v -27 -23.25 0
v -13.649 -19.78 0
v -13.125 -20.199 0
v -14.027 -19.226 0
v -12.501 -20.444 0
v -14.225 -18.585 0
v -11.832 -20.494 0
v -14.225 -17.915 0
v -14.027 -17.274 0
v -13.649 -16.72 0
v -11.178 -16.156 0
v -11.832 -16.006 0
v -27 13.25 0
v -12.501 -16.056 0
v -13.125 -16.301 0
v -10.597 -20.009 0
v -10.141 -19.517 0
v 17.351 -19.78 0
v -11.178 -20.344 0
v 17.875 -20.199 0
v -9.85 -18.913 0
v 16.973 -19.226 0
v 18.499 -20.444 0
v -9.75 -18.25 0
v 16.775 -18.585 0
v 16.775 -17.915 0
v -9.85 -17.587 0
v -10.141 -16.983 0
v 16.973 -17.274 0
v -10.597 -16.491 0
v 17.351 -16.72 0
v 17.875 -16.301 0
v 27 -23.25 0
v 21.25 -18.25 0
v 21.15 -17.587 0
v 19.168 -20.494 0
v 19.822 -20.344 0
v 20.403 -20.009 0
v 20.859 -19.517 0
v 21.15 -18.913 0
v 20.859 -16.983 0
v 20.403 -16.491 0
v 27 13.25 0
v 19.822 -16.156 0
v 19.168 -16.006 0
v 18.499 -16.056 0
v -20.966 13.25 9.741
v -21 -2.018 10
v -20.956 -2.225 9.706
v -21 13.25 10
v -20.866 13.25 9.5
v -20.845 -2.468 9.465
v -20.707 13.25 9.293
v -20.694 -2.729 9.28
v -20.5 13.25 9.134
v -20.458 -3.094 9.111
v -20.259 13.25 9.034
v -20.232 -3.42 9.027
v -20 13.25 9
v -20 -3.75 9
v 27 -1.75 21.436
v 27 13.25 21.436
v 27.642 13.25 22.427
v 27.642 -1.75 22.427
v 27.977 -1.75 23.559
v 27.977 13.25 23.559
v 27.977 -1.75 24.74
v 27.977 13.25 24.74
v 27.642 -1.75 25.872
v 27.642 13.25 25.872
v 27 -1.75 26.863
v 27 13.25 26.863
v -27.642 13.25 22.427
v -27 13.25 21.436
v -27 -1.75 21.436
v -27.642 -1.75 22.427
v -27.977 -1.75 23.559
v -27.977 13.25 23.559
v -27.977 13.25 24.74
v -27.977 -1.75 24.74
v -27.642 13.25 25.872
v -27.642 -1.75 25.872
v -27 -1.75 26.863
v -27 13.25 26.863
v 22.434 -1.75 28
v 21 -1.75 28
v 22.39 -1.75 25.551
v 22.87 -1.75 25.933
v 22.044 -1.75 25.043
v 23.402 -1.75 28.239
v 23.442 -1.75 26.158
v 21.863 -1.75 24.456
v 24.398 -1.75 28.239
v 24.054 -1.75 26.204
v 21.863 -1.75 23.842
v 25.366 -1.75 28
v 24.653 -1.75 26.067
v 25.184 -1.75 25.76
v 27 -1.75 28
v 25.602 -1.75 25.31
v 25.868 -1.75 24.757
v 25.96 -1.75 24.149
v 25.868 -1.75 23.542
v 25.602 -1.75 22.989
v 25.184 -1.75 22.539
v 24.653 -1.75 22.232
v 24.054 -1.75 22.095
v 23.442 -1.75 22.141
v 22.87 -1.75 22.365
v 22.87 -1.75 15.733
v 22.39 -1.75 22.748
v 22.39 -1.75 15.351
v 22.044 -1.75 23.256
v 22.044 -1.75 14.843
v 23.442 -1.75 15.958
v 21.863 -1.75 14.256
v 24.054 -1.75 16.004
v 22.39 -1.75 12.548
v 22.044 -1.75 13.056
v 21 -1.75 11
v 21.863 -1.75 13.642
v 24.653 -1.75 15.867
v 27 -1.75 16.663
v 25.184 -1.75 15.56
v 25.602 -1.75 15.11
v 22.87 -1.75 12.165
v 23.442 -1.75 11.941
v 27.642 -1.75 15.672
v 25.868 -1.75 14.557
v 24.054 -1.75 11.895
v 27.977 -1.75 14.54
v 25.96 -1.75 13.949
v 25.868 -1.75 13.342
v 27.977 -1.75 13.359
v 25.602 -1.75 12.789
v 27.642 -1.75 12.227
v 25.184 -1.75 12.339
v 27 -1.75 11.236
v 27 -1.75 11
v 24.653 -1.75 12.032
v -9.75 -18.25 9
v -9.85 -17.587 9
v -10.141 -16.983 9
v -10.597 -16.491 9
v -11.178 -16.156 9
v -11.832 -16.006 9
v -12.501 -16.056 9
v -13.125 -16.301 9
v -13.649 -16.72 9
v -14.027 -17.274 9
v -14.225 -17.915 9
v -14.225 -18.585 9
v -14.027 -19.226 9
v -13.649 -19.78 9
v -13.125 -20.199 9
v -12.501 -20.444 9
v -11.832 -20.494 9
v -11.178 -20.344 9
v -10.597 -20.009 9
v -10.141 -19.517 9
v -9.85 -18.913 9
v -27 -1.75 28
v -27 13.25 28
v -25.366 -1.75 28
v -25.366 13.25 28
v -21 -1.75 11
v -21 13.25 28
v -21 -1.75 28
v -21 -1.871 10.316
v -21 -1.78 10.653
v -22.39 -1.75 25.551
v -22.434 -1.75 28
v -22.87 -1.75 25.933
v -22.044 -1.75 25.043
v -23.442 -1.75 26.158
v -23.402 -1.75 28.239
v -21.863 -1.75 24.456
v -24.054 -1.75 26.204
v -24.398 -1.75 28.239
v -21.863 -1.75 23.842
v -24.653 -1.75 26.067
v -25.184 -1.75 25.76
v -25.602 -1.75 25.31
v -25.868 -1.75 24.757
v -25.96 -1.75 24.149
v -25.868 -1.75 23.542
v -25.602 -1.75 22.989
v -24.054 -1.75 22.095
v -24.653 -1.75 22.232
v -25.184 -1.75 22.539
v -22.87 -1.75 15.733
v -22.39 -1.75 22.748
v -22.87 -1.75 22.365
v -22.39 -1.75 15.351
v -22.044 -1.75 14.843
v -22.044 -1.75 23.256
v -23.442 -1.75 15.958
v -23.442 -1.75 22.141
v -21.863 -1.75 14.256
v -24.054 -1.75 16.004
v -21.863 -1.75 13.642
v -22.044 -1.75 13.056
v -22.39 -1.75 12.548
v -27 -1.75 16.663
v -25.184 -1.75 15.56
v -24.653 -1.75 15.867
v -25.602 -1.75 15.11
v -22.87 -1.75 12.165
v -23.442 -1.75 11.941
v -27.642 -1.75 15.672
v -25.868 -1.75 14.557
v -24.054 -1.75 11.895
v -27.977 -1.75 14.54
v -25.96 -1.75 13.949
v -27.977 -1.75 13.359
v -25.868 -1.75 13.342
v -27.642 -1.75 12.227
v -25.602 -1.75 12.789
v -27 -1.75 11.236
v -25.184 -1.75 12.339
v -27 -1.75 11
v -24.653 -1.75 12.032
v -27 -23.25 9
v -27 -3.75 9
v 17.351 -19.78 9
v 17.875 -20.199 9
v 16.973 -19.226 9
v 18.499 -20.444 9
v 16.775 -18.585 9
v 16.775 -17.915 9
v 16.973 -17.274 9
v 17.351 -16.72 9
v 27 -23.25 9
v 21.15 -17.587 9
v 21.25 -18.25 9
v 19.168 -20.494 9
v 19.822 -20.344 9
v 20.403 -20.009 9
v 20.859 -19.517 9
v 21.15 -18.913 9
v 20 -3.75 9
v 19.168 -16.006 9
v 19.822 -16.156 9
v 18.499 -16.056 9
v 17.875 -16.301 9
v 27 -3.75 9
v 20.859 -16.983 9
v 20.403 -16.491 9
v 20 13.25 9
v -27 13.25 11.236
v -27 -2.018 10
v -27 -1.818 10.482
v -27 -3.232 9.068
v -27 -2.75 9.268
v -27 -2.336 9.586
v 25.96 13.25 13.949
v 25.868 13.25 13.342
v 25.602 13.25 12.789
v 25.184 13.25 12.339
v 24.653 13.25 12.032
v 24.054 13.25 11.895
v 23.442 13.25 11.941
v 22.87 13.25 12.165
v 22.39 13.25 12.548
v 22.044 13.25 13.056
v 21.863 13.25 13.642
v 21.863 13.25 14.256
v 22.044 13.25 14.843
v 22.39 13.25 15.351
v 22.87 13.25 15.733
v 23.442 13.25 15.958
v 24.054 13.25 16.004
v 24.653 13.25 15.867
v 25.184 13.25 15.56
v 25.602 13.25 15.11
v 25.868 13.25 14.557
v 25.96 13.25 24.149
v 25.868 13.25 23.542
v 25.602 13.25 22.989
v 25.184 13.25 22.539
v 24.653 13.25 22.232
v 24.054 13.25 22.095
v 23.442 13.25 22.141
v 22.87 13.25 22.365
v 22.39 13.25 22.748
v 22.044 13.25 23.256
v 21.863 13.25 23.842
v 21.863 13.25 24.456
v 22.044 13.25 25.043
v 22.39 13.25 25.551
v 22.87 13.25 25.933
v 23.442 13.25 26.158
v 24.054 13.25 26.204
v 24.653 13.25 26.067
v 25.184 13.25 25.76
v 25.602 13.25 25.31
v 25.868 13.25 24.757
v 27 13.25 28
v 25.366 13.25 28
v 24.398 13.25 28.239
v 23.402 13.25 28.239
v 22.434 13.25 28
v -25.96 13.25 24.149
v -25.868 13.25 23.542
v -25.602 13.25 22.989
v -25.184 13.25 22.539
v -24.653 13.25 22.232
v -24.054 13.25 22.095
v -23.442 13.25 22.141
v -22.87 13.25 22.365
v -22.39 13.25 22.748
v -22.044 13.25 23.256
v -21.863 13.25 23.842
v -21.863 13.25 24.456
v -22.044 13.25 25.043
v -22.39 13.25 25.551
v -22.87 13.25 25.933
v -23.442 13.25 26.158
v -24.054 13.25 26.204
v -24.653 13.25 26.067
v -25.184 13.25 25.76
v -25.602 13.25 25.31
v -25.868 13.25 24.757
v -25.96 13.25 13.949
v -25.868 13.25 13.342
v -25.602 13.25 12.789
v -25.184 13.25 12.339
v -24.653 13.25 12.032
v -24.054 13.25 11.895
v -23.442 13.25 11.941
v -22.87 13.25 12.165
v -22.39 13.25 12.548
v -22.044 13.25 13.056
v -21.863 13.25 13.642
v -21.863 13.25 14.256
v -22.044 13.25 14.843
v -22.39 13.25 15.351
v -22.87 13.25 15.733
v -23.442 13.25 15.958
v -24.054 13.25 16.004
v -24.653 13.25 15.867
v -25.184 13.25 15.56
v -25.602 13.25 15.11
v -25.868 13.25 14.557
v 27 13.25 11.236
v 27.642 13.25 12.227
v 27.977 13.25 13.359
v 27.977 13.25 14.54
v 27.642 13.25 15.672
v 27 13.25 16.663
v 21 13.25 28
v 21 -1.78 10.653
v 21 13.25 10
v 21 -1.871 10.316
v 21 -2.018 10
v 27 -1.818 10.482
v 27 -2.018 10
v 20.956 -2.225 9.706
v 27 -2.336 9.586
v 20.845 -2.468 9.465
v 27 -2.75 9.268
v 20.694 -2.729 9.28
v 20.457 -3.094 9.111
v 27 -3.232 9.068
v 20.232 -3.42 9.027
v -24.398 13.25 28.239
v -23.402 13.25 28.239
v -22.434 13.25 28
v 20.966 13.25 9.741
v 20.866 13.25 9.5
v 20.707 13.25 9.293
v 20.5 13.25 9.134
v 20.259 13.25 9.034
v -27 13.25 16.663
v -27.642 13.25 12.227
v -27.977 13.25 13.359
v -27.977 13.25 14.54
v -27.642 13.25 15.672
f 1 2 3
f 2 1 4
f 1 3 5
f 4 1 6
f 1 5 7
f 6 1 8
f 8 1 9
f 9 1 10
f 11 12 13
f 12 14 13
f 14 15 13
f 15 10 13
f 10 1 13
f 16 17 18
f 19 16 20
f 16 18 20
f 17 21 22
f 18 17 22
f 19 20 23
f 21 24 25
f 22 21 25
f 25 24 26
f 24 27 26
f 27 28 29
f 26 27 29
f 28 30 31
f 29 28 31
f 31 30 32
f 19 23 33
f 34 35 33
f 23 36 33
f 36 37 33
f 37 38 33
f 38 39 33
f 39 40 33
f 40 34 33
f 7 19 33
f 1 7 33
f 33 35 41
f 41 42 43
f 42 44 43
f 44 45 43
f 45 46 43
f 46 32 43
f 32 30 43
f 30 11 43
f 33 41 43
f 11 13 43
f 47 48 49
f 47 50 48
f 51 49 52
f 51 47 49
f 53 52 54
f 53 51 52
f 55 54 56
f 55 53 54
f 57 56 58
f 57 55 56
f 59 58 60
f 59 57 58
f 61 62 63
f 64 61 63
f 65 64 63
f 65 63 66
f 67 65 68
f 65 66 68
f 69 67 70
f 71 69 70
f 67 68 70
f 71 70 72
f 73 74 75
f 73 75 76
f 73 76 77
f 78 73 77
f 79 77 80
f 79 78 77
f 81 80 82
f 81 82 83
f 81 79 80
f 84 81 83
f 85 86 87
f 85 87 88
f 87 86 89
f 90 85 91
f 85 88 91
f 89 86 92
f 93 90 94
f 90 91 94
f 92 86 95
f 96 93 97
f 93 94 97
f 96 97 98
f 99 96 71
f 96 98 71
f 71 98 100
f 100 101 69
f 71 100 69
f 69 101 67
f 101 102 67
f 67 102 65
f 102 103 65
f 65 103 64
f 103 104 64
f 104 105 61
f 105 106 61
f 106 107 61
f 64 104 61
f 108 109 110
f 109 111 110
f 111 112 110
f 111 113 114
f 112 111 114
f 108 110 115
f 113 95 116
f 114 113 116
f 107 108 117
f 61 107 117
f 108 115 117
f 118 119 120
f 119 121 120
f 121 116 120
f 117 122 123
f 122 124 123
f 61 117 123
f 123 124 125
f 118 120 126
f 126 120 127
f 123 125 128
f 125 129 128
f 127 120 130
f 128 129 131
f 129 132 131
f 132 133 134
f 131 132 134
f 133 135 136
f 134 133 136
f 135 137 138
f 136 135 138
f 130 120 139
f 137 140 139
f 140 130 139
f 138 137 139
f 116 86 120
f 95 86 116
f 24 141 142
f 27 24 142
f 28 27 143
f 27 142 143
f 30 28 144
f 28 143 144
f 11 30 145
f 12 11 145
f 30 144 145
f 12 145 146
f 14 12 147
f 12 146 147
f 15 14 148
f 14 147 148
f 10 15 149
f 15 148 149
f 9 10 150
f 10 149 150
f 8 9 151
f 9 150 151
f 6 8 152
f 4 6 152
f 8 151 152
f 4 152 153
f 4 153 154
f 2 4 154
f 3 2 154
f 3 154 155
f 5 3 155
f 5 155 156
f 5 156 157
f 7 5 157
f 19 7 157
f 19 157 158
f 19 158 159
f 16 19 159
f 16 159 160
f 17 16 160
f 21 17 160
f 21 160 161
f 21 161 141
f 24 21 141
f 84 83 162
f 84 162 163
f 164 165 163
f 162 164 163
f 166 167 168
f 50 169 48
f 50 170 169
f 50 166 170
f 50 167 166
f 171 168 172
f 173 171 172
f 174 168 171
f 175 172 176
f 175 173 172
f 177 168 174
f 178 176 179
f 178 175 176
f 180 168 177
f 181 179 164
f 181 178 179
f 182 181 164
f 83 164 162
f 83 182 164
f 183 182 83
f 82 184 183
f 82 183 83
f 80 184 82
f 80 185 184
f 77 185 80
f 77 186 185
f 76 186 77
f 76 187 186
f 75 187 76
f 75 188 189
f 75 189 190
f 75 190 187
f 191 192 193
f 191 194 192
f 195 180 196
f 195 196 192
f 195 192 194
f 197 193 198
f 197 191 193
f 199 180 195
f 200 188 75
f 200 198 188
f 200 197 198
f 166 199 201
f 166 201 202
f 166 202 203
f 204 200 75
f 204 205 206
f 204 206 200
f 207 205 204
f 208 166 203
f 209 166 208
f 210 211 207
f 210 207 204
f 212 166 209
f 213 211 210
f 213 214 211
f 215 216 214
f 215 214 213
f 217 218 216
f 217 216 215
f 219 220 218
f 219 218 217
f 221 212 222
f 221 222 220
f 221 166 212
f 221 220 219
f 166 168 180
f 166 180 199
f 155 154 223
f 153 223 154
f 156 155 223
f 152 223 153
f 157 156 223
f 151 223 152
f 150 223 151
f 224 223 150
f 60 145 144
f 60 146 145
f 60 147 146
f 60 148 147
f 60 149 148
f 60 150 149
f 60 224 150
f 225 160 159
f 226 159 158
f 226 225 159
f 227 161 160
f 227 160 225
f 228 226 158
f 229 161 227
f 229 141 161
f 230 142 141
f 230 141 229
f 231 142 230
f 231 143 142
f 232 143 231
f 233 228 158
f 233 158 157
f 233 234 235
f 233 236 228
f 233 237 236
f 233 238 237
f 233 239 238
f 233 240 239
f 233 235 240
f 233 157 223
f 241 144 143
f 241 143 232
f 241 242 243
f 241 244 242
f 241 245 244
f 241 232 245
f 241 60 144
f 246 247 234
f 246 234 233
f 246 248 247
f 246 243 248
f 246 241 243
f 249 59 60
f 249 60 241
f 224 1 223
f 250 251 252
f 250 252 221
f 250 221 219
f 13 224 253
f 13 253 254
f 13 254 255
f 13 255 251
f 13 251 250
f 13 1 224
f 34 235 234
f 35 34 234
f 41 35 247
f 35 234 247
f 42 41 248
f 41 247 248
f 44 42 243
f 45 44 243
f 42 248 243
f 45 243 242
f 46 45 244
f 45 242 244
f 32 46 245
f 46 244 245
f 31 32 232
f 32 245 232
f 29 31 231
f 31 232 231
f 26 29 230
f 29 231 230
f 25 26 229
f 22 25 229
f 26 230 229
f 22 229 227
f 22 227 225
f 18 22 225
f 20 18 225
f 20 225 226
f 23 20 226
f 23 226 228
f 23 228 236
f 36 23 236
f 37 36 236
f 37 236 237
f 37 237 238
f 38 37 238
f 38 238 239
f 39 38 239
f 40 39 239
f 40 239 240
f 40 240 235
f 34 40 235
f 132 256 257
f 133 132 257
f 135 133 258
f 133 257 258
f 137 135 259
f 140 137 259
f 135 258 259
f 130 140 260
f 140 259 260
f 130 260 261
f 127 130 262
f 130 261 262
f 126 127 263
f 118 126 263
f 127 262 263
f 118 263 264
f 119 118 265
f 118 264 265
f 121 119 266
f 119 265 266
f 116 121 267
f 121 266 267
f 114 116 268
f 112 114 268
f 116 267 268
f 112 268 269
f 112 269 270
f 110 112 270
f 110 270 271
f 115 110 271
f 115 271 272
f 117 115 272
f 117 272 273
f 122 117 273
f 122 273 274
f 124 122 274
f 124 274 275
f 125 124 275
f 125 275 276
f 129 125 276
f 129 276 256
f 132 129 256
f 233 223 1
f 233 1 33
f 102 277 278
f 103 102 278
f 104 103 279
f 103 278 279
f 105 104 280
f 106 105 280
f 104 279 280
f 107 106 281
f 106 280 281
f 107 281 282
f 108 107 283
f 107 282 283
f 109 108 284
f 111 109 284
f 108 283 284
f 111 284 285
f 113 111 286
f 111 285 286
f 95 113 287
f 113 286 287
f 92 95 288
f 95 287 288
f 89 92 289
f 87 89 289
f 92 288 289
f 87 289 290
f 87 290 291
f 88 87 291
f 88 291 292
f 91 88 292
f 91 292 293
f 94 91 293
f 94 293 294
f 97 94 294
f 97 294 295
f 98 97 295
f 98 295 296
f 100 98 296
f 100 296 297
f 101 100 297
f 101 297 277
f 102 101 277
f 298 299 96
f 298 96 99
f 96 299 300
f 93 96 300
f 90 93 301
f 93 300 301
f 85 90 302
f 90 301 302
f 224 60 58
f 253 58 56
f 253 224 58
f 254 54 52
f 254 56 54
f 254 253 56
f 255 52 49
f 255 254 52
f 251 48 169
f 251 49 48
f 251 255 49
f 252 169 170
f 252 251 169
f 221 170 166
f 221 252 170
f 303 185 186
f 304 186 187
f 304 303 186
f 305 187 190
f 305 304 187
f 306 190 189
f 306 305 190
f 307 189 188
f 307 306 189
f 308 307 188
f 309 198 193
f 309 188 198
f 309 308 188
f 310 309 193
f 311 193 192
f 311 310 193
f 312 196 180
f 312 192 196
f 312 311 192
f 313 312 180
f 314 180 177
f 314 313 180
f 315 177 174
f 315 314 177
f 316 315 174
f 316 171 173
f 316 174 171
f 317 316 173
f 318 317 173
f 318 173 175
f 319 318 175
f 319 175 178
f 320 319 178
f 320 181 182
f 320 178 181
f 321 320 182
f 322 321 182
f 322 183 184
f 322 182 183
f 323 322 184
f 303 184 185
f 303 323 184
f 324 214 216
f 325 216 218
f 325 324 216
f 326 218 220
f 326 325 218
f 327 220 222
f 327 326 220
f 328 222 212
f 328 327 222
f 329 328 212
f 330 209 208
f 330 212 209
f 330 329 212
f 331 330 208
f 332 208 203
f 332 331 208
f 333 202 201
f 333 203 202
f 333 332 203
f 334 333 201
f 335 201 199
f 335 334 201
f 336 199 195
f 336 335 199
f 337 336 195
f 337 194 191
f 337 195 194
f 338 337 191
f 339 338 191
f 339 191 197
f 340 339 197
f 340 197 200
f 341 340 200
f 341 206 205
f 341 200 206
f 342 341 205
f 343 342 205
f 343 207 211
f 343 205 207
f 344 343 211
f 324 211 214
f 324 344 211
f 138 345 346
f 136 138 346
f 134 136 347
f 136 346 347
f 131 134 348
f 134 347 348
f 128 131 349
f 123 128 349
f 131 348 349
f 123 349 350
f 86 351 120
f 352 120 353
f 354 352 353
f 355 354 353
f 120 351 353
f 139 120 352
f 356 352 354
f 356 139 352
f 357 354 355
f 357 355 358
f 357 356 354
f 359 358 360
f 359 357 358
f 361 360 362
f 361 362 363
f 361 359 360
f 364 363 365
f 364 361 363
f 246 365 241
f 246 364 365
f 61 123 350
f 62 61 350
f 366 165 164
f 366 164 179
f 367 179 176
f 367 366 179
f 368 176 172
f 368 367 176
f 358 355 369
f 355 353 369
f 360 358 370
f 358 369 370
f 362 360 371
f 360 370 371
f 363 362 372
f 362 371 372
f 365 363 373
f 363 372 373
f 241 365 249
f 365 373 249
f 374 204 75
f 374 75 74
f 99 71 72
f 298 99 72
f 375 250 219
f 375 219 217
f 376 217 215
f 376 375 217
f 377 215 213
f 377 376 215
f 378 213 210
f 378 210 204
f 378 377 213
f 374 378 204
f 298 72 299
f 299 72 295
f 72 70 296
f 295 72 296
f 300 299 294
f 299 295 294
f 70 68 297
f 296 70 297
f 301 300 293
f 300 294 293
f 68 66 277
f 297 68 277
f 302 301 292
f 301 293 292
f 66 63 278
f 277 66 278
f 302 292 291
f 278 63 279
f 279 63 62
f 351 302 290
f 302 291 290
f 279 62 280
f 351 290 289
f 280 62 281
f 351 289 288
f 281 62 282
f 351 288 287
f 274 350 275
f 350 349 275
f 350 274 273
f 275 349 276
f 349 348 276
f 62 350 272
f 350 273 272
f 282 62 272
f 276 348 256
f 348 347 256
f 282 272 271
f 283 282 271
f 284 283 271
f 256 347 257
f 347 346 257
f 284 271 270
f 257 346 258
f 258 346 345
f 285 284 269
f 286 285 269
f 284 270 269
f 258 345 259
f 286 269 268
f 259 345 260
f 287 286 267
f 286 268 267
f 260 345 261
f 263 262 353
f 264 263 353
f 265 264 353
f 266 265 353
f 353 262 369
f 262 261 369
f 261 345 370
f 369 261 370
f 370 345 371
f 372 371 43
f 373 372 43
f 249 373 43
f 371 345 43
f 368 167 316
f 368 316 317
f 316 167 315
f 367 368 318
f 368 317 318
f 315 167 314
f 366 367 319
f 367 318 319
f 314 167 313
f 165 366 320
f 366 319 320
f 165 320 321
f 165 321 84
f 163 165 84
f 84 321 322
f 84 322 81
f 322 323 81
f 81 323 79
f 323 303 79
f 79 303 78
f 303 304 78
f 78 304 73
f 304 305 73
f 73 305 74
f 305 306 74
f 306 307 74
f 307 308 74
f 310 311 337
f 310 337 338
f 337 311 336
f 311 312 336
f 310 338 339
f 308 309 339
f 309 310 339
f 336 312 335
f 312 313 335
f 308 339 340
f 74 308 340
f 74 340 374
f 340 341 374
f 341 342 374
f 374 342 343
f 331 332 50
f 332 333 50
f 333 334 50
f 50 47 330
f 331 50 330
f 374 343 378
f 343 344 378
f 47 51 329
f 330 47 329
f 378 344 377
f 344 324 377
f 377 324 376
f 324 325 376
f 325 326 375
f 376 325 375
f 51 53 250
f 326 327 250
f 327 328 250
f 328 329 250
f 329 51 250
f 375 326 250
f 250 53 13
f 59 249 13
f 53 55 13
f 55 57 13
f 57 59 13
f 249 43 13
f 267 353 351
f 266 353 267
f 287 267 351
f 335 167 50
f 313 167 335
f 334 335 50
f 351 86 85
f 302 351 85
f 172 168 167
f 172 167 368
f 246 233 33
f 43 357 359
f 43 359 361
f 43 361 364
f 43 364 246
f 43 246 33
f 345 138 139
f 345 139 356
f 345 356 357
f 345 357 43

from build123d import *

# Parameters (mm, degrees)
SKETCH1_W           = 54
SKETCH1_H           = 26.5
BOSS_EXTRUDE1_DEPTH = 9
SKETCH2_W           = 6
SKETCH2_H           = 15
BOSS_EXTRUDE2_DEPTH = 19
SKETCH4_R           = 2.06
CUT_EXTRUDE1_DEPTH  = 19
SKETCH5_R           = 2.06
BOSS_EXTRUDE3_DEPTH = 15
SKETCH8_W           = 54
SKETCH8_H           = 10
BOSS_EXTRUDE5_DEPTH = 9
SKETCH9_R           = 2.25
CUT_EXTRUDE3_DEPTH  = 15
FILLET1_R           = 2
FILLET2_R           = 1


with BuildPart() as part:
    # Sketch1 → Boss-Extrude1 (new body)
    with BuildSketch(Plane.XY):
        Rectangle(SKETCH1_W, SKETCH1_H)
    boss_extrude1 = extrude(amount=BOSS_EXTRUDE1_DEPTH)

    # Sketch2 → Boss-Extrude2 (add)
    with BuildSketch(Plane.XY.offset(9)):
        with Locations((24, 5.75)):
            Rectangle(SKETCH2_W, SKETCH2_H)
    boss_extrude2 = extrude(amount=BOSS_EXTRUDE2_DEPTH)

    # Sketch4 → Cut-Extrude1 (cut)
    with BuildSketch(Plane(origin=(0, 13.25, 0), x_dir=(1, 0, 0), z_dir=(0, 1, 0))):
        with Locations((23.9, -13.949454959)):
            Circle(SKETCH4_R)
        with Locations((23.9, -24.149454959)):
            Circle(SKETCH4_R)
    cut_extrude1 = extrude(amount=-CUT_EXTRUDE1_DEPTH, mode=Mode.SUBTRACT)

    # Sketch5 → Boss-Extrude3 (add)
    with BuildSketch(Plane(origin=(0, 13.25, 0), x_dir=(1, 0, 0), z_dir=(0, 1, 0))):
        with BuildLine():
            Line((21, -27.075954574), (21, -21.222955343))
            ThreePointArc((21, -21.222955343), (28.02, -24.149454959), (21, -27.075954574))
        make_face()
        with Locations((23.9, -24.149454959)):
            Circle(SKETCH5_R, mode=Mode.SUBTRACT)
        with BuildLine():
            Line((21, -16.875954574), (21, -11.022955343))
            ThreePointArc((21, -11.022955343), (28.02, -13.949454959), (21, -16.875954574))
        make_face()
        with Locations((23.9, -13.949454959)):
            Circle(SKETCH5_R, mode=Mode.SUBTRACT)
    boss_extrude3 = extrude(amount=-BOSS_EXTRUDE3_DEPTH)

    # Sketch8 → Boss-Extrude5 (add, through all)
    with BuildSketch(Plane.XY.offset(9)):
        with Locations((0, -18.25)):
            Rectangle(SKETCH8_W, SKETCH8_H)
    extrude(amount=-BOSS_EXTRUDE5_DEPTH)

    # Sketch9 → Cut-Extrude3 (cut)
    with BuildSketch(Plane.XY.offset(9)):
        with Locations((19, -18.25)):
            Circle(SKETCH9_R)
        with Locations((-12, -18.25)):
            Circle(SKETCH9_R)
    extrude(amount=-CUT_EXTRUDE3_DEPTH, mode=Mode.SUBTRACT)

    # Mirror1: Boss-Extrude1, Boss-Extrude2, Cut-Extrude1, Boss-Extrude3 across plane
    add(boss_extrude1.mirror(Plane.ZY))
    add(boss_extrude2.mirror(Plane.ZY))
    add(cut_extrude1.mirror(Plane.ZY), mode=Mode.SUBTRACT)
    add(boss_extrude3.mirror(Plane.ZY))

    # Fillet1
    fillet1_edges = [part.edges().sort_by_distance(p)[0] for p in [
        (-24, -1.75, 9),
        (24, -1.75, 9),
    ]]
    fillet(fillet1_edges, radius=FILLET1_R)

    # Fillet2
    fillet2_edges = [part.edges().sort_by_distance(p)[0] for p in [
        (-21, 5.75, 9),
        (21, 5.75, 9),
    ]]
    fillet(fillet2_edges, radius=FILLET2_R)


solid = part.part
